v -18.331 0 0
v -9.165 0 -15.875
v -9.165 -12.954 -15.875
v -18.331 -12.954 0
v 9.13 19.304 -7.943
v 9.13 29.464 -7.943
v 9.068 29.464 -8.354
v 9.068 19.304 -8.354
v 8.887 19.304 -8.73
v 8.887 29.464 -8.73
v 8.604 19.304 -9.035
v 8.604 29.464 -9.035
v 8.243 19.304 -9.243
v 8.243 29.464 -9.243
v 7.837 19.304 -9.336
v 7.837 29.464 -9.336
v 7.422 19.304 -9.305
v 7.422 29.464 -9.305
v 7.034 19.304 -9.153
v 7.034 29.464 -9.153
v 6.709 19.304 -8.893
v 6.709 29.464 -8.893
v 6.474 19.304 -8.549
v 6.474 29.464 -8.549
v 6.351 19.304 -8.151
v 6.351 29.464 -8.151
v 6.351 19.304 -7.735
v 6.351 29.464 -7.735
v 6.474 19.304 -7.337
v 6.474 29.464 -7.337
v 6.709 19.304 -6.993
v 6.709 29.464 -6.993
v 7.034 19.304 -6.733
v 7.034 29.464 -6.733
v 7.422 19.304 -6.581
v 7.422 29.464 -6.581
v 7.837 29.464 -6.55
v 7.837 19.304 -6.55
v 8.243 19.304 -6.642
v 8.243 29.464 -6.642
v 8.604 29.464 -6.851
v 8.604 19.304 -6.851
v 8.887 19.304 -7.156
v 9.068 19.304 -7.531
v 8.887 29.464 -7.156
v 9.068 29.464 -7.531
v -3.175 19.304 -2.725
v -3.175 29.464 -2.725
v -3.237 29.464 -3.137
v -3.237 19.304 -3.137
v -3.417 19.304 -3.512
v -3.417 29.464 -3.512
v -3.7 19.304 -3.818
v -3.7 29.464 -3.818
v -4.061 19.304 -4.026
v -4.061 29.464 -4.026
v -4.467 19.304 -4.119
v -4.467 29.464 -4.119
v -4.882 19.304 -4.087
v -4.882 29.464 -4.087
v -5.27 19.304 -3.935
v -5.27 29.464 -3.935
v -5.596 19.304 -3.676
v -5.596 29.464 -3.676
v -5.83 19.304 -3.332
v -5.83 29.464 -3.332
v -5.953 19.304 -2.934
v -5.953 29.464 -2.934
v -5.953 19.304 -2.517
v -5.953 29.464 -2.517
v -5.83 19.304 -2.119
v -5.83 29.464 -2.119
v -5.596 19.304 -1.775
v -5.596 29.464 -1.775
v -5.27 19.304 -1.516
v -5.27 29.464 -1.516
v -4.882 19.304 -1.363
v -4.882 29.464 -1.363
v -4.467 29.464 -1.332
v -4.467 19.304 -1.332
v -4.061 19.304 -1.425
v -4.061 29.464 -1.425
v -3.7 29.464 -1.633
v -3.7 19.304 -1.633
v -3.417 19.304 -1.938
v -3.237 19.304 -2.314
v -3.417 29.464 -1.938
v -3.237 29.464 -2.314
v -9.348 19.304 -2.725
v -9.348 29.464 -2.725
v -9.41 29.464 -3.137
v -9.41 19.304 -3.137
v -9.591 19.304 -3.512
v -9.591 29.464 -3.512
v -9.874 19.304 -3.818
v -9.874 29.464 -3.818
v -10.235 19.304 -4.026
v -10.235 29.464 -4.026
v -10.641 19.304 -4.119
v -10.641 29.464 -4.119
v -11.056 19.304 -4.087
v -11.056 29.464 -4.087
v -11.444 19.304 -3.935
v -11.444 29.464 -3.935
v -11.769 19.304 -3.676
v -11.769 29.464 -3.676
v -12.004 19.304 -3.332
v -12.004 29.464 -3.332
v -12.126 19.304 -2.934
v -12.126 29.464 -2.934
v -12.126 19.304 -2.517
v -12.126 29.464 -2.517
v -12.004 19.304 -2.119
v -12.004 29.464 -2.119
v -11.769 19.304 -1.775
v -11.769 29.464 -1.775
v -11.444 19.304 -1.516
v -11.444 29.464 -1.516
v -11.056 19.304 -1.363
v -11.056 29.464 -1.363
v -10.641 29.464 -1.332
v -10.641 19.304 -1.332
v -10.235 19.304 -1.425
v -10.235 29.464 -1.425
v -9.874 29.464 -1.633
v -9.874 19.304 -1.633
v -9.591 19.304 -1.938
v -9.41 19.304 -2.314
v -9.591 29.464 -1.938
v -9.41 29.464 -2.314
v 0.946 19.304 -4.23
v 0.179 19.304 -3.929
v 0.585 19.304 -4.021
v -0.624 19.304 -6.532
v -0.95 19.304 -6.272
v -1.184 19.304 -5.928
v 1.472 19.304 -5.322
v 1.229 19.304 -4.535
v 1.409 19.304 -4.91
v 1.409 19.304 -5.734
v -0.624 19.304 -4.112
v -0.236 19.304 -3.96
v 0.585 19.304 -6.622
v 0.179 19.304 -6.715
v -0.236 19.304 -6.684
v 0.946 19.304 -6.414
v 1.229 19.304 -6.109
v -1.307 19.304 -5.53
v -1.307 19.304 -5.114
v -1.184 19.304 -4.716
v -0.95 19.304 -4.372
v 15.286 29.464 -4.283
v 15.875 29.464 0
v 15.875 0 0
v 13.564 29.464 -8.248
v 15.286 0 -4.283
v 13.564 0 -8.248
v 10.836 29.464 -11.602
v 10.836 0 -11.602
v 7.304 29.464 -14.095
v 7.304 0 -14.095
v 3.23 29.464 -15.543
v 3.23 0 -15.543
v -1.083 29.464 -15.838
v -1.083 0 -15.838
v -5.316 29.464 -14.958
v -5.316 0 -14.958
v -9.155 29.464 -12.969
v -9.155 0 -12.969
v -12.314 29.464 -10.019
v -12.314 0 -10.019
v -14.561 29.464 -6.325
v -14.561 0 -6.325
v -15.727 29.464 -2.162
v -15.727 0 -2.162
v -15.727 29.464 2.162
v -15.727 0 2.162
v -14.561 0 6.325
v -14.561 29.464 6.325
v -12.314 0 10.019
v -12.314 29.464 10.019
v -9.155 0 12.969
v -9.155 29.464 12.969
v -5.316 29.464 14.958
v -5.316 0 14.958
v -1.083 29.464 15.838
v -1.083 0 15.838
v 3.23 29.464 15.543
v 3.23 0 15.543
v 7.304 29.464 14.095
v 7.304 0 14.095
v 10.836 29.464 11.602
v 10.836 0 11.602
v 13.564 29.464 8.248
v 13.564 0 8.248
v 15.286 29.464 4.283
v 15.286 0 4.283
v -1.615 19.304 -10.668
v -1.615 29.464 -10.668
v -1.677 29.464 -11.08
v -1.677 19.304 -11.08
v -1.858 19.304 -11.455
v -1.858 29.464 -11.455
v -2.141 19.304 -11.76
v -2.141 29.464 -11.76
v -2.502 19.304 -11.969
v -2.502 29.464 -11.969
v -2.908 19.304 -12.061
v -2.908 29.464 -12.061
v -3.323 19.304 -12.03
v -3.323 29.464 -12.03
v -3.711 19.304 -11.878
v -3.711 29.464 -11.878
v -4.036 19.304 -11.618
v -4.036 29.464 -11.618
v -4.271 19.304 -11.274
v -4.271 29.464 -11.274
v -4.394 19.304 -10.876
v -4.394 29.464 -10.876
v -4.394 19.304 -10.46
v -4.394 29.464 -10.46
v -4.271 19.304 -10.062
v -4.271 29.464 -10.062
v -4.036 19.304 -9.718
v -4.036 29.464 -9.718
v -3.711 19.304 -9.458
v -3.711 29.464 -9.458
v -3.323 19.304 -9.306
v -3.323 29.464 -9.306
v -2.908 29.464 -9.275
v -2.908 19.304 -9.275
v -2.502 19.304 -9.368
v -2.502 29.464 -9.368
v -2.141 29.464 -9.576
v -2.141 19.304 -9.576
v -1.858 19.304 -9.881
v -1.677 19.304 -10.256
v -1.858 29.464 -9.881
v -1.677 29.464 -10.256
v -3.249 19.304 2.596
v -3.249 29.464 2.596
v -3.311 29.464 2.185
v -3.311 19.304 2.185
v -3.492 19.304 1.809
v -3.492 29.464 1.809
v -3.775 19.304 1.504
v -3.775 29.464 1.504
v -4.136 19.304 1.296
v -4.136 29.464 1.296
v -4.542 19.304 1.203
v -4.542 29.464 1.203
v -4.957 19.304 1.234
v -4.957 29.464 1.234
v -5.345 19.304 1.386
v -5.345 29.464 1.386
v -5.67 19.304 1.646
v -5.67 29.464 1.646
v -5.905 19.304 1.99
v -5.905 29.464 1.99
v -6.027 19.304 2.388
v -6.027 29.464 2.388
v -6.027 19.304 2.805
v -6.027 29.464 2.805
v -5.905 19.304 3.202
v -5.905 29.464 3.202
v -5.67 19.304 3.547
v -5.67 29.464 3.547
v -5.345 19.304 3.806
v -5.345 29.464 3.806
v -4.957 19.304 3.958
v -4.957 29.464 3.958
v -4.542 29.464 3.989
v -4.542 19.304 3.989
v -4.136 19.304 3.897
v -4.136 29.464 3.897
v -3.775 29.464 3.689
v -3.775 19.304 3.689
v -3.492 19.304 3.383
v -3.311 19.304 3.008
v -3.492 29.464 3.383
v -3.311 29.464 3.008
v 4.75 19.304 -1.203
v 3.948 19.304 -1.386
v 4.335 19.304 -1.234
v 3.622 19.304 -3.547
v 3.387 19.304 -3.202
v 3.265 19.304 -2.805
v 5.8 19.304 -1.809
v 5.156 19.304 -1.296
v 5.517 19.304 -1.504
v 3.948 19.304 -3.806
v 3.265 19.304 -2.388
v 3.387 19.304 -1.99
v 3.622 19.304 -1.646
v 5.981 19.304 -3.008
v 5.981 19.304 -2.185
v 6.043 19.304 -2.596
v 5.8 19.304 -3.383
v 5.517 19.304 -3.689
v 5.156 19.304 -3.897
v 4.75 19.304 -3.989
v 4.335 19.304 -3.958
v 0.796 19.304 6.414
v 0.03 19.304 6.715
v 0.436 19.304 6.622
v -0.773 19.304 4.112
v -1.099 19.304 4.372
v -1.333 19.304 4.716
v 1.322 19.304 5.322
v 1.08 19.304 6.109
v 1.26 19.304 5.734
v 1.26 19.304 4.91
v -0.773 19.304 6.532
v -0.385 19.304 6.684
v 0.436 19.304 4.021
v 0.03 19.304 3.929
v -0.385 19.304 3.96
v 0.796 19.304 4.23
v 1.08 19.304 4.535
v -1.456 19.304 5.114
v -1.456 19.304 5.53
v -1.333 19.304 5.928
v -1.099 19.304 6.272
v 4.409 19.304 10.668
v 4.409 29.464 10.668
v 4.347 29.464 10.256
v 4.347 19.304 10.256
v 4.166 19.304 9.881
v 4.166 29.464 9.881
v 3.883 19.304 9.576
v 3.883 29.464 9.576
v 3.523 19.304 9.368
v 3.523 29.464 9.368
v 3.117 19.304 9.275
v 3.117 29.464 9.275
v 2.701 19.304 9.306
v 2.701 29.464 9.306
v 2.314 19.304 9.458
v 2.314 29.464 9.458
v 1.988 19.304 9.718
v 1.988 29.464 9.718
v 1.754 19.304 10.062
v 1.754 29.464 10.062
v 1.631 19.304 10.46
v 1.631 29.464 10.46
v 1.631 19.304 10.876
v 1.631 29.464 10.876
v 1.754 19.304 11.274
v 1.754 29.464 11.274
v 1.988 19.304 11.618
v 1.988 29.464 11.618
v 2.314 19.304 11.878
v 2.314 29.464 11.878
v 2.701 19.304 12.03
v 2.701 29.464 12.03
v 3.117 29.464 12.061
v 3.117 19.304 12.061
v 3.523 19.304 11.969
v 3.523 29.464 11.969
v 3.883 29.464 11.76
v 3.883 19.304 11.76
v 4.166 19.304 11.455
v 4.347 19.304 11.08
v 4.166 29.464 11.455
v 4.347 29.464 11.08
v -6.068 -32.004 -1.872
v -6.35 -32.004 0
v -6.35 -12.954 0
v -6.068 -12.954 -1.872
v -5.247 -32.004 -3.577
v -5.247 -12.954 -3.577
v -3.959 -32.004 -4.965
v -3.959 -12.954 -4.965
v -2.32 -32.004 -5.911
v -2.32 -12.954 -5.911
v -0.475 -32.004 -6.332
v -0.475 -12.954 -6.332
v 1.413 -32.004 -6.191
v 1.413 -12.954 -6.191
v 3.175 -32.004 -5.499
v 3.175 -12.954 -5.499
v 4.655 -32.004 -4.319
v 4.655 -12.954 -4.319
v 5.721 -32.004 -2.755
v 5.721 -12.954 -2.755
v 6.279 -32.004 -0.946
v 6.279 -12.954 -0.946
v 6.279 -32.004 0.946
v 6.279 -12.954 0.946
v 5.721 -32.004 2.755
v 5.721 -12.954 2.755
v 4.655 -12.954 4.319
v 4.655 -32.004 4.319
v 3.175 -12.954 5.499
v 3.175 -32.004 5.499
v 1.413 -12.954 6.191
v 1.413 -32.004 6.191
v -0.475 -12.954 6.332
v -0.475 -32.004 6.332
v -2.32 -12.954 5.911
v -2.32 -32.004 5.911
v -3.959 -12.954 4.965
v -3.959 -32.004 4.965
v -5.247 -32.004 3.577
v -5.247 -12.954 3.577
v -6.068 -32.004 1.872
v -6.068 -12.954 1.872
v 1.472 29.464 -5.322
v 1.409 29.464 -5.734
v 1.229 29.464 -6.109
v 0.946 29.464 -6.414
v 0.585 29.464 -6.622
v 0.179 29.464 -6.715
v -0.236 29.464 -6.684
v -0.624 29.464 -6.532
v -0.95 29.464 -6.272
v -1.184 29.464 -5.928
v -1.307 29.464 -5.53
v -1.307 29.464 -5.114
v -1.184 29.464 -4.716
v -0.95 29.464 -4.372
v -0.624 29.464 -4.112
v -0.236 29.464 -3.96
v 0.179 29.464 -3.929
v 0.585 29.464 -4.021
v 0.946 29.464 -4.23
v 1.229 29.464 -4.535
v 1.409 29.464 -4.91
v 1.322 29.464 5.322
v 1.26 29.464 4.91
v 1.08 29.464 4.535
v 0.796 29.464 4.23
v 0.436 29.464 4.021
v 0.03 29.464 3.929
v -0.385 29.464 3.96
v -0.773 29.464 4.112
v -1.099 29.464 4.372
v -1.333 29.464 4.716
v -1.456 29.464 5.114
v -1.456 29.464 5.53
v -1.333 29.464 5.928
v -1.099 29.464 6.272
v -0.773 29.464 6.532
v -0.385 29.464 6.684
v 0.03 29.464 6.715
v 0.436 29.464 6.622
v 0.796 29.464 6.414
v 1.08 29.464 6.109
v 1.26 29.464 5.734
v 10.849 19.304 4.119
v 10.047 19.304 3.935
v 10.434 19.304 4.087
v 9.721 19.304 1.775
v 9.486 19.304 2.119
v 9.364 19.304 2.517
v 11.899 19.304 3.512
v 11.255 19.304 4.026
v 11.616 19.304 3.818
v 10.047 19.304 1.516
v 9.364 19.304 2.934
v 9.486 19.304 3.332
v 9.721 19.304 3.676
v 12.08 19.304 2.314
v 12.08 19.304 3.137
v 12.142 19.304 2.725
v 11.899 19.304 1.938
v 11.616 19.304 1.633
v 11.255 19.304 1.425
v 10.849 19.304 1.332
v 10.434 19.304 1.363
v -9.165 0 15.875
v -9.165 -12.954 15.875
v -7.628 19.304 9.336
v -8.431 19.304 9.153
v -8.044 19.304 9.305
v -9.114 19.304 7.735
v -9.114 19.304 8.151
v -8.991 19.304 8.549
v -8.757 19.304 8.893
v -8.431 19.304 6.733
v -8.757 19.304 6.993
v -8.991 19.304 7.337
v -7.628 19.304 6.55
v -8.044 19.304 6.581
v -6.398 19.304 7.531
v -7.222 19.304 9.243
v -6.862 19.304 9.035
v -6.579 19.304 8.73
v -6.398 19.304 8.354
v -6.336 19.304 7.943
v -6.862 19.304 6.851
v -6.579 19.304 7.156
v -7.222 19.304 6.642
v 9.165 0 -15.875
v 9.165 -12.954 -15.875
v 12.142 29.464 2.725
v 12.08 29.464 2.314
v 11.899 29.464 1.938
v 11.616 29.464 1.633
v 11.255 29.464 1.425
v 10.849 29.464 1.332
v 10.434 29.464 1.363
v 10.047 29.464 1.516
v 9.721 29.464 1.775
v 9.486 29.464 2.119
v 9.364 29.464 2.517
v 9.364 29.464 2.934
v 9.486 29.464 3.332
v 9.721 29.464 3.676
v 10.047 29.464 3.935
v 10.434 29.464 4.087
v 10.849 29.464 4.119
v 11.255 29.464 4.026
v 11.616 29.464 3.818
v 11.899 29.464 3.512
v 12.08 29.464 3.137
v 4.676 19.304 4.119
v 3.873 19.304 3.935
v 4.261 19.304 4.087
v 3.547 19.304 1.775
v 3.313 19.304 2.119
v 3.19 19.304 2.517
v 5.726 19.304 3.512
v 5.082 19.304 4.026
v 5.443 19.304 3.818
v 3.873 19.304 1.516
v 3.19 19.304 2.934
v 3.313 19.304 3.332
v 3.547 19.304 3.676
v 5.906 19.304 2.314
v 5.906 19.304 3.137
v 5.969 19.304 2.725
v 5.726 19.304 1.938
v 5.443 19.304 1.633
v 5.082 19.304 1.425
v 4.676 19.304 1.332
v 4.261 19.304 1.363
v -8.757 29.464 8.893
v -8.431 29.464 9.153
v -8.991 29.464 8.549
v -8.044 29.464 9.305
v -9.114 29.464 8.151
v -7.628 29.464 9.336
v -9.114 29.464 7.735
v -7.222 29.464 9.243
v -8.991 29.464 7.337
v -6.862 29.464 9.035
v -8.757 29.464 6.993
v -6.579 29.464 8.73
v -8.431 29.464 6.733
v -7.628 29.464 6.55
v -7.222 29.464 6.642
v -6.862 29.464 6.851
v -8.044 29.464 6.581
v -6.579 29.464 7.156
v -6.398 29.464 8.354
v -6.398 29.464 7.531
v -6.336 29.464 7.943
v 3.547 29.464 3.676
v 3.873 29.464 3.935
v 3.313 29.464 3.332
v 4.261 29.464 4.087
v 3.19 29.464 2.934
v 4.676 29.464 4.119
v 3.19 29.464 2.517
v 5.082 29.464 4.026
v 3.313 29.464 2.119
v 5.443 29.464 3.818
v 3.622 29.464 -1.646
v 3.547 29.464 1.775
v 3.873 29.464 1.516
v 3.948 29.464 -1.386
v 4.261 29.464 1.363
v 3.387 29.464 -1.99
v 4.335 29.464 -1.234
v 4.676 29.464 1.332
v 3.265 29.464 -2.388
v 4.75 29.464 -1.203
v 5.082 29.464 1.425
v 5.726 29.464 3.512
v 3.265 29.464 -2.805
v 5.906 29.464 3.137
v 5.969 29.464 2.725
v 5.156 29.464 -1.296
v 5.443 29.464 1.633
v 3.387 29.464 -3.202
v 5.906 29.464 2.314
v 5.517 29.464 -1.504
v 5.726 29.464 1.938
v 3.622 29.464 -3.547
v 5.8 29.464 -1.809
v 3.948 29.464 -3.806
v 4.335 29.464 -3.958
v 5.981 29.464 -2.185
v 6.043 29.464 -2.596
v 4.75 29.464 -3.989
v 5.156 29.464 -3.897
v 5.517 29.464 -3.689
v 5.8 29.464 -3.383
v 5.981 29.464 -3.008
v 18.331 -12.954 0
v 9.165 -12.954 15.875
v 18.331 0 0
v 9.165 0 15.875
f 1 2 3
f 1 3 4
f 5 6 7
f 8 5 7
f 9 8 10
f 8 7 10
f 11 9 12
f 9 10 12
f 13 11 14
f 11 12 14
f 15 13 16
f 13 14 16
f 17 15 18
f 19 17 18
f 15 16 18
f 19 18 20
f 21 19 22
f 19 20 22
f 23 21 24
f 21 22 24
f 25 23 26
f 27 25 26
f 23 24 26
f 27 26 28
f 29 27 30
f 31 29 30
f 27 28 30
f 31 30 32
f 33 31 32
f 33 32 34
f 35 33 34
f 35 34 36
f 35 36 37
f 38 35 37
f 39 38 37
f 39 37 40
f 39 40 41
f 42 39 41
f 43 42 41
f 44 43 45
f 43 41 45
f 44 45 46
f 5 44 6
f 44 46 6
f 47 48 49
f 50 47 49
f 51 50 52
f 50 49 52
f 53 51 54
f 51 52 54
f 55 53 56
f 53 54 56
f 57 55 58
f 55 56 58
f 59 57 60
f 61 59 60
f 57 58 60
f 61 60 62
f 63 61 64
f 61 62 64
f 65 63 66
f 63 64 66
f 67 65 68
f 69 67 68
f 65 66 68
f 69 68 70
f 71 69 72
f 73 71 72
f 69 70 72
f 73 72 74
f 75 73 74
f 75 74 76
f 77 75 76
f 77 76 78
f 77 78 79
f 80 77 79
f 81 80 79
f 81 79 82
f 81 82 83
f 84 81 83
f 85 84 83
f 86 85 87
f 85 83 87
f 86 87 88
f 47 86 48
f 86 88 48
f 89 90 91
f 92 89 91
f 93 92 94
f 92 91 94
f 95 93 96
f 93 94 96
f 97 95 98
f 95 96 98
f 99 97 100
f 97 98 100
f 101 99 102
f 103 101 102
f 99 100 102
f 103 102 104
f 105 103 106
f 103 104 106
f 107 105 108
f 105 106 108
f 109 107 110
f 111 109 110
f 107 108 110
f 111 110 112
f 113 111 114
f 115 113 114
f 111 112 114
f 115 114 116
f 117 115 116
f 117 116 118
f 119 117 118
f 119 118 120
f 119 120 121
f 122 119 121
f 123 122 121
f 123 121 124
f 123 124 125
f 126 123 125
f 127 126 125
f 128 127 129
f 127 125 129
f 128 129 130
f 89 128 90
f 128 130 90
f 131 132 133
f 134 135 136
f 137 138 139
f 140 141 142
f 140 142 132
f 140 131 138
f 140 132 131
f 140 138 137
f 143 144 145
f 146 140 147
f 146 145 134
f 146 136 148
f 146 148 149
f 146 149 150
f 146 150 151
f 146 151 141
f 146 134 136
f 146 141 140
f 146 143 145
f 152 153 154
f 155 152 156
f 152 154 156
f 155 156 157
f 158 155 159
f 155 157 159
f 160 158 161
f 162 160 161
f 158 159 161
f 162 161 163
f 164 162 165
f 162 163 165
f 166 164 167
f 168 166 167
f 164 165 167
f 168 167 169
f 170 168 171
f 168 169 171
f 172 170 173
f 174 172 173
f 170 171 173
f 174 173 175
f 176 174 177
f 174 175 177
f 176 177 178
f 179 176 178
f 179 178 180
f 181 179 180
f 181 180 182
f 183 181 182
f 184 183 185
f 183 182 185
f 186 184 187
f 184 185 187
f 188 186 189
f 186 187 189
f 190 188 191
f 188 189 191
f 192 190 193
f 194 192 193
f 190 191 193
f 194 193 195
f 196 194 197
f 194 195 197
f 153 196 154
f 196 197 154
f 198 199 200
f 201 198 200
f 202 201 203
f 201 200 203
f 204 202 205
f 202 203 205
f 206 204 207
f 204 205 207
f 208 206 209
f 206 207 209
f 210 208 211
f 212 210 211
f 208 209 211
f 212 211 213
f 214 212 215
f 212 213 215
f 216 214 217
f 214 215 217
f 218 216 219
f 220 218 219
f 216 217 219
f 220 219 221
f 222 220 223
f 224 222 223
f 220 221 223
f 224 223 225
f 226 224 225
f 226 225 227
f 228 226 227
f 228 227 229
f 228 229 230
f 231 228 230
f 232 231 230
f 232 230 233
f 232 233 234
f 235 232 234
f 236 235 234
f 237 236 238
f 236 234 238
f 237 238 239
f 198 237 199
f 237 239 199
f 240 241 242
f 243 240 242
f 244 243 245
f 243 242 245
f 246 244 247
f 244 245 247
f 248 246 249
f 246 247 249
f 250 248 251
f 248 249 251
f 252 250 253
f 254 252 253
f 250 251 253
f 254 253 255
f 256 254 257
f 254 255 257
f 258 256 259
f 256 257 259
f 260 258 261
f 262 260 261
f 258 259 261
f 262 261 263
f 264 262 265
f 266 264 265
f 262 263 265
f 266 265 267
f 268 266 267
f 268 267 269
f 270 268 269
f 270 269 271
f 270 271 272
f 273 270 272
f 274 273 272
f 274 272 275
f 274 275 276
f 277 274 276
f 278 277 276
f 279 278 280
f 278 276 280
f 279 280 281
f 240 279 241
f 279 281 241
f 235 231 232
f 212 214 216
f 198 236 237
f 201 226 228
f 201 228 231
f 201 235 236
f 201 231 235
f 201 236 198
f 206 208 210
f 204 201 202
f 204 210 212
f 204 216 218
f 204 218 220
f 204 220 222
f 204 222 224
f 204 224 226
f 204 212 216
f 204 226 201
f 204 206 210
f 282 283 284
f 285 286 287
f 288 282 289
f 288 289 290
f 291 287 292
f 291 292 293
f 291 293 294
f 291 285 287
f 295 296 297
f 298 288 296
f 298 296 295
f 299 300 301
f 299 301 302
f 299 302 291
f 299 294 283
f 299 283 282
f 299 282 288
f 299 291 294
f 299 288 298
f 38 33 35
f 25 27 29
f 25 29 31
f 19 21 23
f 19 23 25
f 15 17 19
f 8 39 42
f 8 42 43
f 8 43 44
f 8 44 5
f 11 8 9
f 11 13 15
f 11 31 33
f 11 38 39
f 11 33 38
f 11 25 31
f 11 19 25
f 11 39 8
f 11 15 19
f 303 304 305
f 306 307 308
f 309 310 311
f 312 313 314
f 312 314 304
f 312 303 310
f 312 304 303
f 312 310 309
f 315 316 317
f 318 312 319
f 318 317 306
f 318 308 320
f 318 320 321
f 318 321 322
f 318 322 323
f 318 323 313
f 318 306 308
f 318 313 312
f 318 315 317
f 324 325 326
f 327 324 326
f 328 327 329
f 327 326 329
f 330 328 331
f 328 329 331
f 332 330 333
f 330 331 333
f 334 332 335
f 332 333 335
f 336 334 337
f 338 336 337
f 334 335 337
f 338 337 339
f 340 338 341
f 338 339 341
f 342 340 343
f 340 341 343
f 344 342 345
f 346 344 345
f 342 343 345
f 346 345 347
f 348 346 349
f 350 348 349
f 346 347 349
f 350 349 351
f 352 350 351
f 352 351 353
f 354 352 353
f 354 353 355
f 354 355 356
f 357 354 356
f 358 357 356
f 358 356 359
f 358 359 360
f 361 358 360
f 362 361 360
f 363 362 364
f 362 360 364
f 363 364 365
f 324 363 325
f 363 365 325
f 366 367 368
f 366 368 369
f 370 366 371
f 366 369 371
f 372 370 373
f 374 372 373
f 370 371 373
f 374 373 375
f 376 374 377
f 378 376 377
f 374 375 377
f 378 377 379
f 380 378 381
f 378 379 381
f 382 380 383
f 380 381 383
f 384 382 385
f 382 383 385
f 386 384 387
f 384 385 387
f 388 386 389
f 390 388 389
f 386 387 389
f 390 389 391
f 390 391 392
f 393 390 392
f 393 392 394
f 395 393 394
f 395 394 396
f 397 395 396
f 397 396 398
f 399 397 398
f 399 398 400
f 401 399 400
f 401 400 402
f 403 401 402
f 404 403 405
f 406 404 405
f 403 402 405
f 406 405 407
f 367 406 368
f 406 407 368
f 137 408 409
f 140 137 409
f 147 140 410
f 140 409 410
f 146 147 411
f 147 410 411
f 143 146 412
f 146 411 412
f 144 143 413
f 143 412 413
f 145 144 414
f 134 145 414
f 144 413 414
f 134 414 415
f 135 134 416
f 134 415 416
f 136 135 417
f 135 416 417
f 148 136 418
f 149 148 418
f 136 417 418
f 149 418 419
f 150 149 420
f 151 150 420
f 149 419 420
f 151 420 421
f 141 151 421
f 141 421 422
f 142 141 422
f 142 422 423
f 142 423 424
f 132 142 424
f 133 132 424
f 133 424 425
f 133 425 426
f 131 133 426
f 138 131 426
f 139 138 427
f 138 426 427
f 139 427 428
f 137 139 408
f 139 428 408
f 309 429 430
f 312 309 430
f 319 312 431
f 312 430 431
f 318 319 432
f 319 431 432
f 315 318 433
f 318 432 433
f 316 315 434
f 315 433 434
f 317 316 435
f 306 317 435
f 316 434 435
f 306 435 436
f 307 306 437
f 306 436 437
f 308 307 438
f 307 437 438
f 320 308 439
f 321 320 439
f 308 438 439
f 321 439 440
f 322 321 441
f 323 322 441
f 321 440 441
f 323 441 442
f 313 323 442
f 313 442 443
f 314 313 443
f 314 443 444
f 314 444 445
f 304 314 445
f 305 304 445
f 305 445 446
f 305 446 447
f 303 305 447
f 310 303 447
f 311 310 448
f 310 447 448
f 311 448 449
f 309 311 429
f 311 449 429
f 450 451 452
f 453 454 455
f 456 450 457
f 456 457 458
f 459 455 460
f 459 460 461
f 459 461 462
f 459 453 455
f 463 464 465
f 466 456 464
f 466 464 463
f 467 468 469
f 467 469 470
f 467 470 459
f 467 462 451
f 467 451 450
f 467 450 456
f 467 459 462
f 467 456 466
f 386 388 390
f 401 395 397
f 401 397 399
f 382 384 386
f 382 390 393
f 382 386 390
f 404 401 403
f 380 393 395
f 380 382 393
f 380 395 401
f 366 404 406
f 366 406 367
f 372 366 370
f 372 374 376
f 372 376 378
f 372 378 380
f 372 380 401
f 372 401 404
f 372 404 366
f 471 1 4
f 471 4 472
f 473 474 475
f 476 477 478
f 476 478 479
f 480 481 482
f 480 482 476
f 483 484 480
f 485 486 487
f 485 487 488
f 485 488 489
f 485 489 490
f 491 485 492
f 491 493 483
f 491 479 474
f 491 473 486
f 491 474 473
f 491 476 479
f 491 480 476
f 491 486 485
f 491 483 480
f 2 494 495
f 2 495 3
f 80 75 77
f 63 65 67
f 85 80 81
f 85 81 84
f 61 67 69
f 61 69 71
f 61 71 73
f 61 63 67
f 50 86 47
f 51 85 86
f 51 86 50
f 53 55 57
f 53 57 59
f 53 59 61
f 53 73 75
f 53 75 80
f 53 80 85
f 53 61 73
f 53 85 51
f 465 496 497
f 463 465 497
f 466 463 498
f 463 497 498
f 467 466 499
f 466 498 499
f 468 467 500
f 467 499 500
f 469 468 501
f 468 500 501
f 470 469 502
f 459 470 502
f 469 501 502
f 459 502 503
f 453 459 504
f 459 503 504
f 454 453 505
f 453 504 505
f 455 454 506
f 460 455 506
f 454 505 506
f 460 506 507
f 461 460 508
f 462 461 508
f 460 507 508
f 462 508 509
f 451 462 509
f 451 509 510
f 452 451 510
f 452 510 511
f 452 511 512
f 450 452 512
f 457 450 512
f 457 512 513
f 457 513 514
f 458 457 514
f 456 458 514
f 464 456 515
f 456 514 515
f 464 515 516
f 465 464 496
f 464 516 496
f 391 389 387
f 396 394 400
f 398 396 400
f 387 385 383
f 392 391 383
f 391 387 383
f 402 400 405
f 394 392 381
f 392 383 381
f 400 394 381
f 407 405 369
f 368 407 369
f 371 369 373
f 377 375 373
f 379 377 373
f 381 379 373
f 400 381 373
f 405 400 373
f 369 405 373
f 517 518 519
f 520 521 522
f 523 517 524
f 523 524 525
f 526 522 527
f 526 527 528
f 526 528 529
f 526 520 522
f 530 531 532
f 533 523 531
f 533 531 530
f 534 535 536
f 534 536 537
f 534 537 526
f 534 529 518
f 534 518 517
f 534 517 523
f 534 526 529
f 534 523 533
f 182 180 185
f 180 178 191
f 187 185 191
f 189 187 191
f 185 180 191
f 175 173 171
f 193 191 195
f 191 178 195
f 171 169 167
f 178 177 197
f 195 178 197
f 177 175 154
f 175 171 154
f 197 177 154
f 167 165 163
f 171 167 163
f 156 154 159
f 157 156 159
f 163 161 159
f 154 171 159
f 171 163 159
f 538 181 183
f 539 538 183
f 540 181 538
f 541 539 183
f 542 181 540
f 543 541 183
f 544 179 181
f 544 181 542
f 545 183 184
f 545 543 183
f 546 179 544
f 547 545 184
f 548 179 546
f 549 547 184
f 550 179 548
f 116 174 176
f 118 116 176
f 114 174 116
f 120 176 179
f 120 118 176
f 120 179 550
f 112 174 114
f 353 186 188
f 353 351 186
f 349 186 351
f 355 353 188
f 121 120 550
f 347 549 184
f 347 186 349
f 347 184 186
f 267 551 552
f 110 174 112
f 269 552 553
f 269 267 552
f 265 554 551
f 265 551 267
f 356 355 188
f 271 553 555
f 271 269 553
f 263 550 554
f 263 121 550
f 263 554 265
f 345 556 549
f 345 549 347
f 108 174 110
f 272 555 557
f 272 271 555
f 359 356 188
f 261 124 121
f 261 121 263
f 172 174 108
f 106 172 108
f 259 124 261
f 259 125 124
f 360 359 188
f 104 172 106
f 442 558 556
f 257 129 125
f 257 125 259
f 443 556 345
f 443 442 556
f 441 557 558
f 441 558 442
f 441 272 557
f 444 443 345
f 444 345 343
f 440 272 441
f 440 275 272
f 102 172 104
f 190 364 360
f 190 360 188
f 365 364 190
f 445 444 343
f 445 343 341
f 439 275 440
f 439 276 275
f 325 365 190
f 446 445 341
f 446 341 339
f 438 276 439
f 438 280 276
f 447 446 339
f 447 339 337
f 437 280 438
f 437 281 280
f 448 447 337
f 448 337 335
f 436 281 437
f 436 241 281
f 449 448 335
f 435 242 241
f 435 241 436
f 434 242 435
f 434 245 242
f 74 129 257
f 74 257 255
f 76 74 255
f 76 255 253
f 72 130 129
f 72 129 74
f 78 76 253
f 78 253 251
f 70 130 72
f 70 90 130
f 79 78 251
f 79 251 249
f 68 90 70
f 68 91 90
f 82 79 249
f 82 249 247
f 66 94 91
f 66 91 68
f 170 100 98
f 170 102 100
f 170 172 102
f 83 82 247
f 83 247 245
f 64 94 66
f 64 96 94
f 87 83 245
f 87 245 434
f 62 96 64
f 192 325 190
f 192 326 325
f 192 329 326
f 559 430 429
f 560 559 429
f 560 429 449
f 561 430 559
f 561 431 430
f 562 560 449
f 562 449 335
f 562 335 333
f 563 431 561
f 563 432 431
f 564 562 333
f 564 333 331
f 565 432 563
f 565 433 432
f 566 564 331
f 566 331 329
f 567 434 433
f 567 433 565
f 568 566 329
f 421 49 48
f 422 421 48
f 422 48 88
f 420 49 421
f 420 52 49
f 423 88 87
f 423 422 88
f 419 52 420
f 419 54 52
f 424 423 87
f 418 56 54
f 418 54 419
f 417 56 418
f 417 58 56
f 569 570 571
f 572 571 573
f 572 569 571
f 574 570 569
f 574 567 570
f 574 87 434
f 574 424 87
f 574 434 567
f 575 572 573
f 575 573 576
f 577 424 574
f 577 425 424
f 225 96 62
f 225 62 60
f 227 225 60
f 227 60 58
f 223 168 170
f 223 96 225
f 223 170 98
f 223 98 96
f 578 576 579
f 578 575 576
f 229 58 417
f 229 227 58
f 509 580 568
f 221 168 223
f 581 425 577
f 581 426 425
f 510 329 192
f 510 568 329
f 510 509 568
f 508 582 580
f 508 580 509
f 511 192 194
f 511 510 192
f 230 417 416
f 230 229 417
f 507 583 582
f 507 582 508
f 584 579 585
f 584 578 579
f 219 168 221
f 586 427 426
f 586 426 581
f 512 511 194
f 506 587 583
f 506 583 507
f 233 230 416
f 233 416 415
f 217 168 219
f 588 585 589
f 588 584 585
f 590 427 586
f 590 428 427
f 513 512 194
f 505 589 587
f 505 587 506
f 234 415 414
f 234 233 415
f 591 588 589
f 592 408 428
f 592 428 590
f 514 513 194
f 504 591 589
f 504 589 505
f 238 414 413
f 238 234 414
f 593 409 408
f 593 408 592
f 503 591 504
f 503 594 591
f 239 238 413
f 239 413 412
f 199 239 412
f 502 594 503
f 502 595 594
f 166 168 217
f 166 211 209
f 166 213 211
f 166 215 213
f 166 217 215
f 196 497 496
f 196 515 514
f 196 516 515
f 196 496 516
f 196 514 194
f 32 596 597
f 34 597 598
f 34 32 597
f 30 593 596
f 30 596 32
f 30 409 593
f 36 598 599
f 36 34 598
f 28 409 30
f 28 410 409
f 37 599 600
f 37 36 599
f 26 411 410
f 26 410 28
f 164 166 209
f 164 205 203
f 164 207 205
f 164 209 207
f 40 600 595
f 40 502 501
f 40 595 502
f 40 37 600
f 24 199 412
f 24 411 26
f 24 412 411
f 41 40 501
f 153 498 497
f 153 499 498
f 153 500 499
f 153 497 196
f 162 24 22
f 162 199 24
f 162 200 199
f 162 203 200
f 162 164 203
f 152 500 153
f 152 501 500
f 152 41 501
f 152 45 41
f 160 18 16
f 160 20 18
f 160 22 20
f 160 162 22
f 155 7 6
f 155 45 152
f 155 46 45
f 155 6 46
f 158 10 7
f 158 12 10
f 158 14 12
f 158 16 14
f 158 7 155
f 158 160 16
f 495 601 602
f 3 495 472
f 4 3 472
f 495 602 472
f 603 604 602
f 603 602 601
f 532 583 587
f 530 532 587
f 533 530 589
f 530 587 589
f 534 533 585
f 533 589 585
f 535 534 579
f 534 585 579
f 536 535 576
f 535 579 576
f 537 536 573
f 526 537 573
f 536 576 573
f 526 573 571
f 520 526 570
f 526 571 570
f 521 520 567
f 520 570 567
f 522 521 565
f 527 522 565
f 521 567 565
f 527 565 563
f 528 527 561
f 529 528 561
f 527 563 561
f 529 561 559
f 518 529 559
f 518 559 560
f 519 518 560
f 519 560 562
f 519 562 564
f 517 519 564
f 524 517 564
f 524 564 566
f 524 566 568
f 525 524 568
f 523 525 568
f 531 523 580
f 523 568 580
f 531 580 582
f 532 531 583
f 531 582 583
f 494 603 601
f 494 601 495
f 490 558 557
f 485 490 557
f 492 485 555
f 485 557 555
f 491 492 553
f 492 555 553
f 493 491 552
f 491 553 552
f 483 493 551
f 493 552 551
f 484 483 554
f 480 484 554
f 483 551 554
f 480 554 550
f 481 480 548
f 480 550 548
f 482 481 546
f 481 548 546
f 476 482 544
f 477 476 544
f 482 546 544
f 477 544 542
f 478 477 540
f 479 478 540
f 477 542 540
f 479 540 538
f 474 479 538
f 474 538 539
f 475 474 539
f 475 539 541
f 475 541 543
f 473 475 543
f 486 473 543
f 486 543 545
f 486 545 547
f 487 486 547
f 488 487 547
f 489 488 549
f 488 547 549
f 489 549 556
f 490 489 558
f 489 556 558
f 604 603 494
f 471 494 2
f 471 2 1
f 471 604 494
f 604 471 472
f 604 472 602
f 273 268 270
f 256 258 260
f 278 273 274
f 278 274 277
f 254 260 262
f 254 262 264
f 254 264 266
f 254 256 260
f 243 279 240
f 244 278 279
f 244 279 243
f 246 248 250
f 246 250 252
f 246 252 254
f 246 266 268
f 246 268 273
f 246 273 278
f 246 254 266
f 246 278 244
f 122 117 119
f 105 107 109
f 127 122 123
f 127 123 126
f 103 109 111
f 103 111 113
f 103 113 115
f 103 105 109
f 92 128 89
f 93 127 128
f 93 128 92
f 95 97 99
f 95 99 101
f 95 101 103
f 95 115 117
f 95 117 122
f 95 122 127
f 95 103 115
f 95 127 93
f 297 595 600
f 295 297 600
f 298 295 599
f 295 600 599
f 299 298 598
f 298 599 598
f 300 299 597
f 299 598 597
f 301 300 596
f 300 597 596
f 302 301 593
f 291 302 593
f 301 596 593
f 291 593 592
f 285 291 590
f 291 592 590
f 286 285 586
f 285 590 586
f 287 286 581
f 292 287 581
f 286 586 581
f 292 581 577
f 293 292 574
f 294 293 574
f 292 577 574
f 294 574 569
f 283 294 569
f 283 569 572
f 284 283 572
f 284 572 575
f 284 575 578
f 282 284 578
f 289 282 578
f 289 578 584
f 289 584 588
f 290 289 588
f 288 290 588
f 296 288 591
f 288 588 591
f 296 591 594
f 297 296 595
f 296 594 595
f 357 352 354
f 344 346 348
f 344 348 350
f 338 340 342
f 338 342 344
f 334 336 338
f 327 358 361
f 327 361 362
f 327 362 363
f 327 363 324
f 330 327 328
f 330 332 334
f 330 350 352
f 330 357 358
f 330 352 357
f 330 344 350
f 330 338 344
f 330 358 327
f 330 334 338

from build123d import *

# Parameters (mm, degrees)
SKETCH1_R                  = 15.875
NEOPRENE_BODY_DEPTH        = 29.464
ALUMINUM_BRONZE_BODY_DEPTH = 12.954
SKETCH3_R                  = 6.35
F_1_2_20_UNF_2A_DEPTH      = 19.05
SKETCH4_R                  = 1.397
CUT_EXTRUDE1_DEPTH         = 10.16


with BuildPart() as part:
    # Sketch1 → Neoprene Body (new body)
    with BuildSketch(Plane(origin=(0, 0, 0), x_dir=(1, 0, 0), z_dir=(0, 1, 0))):
        Circle(SKETCH1_R)
    extrude(amount=NEOPRENE_BODY_DEPTH)

    # Sketch4 → Cut-Extrude1 (cut)
    with BuildSketch(Plane(origin=(0, 29.464, 0), x_dir=(1, 0, 0), z_dir=(0, 1, 0))):
        with Locations((10.745000968, -2.725436897)):
            Circle(SKETCH4_R)
        with Locations((4.571512411, -2.725436897)):
            Circle(SKETCH4_R)
        with Locations((3.012202894, -10.668162251)):
            Circle(SKETCH4_R)
        with Locations((-0.074541384, -5.321764331)):
            Circle(SKETCH4_R)
        with Locations((-7.732798074, -7.942725353)):
            Circle(SKETCH4_R)
        with Locations((-4.646053795, -2.596327433)):
            Circle(SKETCH4_R)
        with Locations((-10.745000968, 2.725436897)):
            Circle(SKETCH4_R)
        with Locations((-4.571512411, 2.725436897)):
            Circle(SKETCH4_R)
        with Locations((-3.012202894, 10.668162251)):
            Circle(SKETCH4_R)
        with Locations((0.074541384, 5.321764331)):
            Circle(SKETCH4_R)
        with Locations((7.732798074, 7.942725353)):
            Circle(SKETCH4_R)
        with Locations((4.646053795, 2.596327433)):
            Circle(SKETCH4_R)
    extrude(amount=-CUT_EXTRUDE1_DEPTH, mode=Mode.SUBTRACT)


with BuildPart() as body_2:
    # Sketch2 → Aluminum Bronze Body (new body)
    with BuildSketch(Plane.XZ):
        Polygon((-9.165435523, 15.875), (9.165435523, 15.875), (18.330871047, 0), (9.165435523, -15.875), (-9.165435523, -15.875), (-18.330871047, 0), align=None)
    extrude(amount=ALUMINUM_BRONZE_BODY_DEPTH)


with BuildPart() as body_3:
    # Sketch3 → 1_2-20 UNF 2A (new body)
    with BuildSketch(Plane(origin=(0, -12.954, 0), x_dir=(-1, 0, 0), z_dir=(0, -1, 0))):
        Circle(SKETCH3_R)
    extrude(amount=F_1_2_20_UNF_2A_DEPTH)


solid = Compound([part.part, body_2.part, body_3.part])
